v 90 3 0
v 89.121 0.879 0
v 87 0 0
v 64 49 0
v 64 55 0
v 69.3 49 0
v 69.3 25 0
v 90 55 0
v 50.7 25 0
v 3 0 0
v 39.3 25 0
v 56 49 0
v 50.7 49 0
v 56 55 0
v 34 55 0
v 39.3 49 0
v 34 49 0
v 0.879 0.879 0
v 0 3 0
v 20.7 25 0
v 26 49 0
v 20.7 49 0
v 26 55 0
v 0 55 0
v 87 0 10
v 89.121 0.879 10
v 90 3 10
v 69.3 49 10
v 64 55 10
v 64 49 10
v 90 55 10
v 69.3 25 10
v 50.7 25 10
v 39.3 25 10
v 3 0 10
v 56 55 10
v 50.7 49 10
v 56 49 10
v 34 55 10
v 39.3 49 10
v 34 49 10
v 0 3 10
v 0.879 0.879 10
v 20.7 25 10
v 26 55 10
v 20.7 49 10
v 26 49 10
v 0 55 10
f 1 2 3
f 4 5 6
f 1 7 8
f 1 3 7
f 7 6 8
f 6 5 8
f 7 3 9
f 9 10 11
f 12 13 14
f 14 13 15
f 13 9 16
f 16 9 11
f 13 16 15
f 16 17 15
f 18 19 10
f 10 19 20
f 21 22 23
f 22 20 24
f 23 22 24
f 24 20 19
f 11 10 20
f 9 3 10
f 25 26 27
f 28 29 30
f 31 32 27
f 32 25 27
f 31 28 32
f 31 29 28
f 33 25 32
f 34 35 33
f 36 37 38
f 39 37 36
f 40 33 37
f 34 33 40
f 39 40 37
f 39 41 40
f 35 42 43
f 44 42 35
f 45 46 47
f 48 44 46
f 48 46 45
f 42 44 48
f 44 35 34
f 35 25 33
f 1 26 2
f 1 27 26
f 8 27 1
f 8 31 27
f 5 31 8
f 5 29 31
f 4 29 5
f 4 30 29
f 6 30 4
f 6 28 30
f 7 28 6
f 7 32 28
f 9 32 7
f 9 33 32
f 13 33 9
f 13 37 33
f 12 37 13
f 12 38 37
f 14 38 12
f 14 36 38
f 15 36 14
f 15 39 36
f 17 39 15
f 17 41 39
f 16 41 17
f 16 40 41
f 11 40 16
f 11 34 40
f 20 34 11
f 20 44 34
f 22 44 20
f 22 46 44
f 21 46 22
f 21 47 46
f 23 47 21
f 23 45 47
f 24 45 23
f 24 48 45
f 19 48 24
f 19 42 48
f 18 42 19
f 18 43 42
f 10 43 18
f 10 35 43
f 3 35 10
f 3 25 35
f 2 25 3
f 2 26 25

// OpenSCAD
$fn = 32;

// ----------------------------------------------------------------------
// Window plate: 90 x 55 mm, 2 open windows
// ----------------------------------------------------------------------

// --- parameters (mm) ---
profile_height = 10;      // extrusion height
profile_points = 24;      // points of the closed outline

profile = [[0, 3], [0.879, 0.879], [3, 0], [87, 0], [89.121, 0.879], [90, 3], [90, 55], [64, 55], [64, 49], [69.3, 49], [69.3, 25], [50.7, 25], [50.7, 49], [56, 49], [56, 55], [34, 55], [34, 49], [39.3, 49], [39.3, 25], [20.7, 25], [20.7, 49], [26, 49], [26, 55], [0, 55]];  // single closed polygon, 24 points, counter clockwise

// --- the one profile operation ---
linear_extrude(height = profile_height) polygon(points = profile);
